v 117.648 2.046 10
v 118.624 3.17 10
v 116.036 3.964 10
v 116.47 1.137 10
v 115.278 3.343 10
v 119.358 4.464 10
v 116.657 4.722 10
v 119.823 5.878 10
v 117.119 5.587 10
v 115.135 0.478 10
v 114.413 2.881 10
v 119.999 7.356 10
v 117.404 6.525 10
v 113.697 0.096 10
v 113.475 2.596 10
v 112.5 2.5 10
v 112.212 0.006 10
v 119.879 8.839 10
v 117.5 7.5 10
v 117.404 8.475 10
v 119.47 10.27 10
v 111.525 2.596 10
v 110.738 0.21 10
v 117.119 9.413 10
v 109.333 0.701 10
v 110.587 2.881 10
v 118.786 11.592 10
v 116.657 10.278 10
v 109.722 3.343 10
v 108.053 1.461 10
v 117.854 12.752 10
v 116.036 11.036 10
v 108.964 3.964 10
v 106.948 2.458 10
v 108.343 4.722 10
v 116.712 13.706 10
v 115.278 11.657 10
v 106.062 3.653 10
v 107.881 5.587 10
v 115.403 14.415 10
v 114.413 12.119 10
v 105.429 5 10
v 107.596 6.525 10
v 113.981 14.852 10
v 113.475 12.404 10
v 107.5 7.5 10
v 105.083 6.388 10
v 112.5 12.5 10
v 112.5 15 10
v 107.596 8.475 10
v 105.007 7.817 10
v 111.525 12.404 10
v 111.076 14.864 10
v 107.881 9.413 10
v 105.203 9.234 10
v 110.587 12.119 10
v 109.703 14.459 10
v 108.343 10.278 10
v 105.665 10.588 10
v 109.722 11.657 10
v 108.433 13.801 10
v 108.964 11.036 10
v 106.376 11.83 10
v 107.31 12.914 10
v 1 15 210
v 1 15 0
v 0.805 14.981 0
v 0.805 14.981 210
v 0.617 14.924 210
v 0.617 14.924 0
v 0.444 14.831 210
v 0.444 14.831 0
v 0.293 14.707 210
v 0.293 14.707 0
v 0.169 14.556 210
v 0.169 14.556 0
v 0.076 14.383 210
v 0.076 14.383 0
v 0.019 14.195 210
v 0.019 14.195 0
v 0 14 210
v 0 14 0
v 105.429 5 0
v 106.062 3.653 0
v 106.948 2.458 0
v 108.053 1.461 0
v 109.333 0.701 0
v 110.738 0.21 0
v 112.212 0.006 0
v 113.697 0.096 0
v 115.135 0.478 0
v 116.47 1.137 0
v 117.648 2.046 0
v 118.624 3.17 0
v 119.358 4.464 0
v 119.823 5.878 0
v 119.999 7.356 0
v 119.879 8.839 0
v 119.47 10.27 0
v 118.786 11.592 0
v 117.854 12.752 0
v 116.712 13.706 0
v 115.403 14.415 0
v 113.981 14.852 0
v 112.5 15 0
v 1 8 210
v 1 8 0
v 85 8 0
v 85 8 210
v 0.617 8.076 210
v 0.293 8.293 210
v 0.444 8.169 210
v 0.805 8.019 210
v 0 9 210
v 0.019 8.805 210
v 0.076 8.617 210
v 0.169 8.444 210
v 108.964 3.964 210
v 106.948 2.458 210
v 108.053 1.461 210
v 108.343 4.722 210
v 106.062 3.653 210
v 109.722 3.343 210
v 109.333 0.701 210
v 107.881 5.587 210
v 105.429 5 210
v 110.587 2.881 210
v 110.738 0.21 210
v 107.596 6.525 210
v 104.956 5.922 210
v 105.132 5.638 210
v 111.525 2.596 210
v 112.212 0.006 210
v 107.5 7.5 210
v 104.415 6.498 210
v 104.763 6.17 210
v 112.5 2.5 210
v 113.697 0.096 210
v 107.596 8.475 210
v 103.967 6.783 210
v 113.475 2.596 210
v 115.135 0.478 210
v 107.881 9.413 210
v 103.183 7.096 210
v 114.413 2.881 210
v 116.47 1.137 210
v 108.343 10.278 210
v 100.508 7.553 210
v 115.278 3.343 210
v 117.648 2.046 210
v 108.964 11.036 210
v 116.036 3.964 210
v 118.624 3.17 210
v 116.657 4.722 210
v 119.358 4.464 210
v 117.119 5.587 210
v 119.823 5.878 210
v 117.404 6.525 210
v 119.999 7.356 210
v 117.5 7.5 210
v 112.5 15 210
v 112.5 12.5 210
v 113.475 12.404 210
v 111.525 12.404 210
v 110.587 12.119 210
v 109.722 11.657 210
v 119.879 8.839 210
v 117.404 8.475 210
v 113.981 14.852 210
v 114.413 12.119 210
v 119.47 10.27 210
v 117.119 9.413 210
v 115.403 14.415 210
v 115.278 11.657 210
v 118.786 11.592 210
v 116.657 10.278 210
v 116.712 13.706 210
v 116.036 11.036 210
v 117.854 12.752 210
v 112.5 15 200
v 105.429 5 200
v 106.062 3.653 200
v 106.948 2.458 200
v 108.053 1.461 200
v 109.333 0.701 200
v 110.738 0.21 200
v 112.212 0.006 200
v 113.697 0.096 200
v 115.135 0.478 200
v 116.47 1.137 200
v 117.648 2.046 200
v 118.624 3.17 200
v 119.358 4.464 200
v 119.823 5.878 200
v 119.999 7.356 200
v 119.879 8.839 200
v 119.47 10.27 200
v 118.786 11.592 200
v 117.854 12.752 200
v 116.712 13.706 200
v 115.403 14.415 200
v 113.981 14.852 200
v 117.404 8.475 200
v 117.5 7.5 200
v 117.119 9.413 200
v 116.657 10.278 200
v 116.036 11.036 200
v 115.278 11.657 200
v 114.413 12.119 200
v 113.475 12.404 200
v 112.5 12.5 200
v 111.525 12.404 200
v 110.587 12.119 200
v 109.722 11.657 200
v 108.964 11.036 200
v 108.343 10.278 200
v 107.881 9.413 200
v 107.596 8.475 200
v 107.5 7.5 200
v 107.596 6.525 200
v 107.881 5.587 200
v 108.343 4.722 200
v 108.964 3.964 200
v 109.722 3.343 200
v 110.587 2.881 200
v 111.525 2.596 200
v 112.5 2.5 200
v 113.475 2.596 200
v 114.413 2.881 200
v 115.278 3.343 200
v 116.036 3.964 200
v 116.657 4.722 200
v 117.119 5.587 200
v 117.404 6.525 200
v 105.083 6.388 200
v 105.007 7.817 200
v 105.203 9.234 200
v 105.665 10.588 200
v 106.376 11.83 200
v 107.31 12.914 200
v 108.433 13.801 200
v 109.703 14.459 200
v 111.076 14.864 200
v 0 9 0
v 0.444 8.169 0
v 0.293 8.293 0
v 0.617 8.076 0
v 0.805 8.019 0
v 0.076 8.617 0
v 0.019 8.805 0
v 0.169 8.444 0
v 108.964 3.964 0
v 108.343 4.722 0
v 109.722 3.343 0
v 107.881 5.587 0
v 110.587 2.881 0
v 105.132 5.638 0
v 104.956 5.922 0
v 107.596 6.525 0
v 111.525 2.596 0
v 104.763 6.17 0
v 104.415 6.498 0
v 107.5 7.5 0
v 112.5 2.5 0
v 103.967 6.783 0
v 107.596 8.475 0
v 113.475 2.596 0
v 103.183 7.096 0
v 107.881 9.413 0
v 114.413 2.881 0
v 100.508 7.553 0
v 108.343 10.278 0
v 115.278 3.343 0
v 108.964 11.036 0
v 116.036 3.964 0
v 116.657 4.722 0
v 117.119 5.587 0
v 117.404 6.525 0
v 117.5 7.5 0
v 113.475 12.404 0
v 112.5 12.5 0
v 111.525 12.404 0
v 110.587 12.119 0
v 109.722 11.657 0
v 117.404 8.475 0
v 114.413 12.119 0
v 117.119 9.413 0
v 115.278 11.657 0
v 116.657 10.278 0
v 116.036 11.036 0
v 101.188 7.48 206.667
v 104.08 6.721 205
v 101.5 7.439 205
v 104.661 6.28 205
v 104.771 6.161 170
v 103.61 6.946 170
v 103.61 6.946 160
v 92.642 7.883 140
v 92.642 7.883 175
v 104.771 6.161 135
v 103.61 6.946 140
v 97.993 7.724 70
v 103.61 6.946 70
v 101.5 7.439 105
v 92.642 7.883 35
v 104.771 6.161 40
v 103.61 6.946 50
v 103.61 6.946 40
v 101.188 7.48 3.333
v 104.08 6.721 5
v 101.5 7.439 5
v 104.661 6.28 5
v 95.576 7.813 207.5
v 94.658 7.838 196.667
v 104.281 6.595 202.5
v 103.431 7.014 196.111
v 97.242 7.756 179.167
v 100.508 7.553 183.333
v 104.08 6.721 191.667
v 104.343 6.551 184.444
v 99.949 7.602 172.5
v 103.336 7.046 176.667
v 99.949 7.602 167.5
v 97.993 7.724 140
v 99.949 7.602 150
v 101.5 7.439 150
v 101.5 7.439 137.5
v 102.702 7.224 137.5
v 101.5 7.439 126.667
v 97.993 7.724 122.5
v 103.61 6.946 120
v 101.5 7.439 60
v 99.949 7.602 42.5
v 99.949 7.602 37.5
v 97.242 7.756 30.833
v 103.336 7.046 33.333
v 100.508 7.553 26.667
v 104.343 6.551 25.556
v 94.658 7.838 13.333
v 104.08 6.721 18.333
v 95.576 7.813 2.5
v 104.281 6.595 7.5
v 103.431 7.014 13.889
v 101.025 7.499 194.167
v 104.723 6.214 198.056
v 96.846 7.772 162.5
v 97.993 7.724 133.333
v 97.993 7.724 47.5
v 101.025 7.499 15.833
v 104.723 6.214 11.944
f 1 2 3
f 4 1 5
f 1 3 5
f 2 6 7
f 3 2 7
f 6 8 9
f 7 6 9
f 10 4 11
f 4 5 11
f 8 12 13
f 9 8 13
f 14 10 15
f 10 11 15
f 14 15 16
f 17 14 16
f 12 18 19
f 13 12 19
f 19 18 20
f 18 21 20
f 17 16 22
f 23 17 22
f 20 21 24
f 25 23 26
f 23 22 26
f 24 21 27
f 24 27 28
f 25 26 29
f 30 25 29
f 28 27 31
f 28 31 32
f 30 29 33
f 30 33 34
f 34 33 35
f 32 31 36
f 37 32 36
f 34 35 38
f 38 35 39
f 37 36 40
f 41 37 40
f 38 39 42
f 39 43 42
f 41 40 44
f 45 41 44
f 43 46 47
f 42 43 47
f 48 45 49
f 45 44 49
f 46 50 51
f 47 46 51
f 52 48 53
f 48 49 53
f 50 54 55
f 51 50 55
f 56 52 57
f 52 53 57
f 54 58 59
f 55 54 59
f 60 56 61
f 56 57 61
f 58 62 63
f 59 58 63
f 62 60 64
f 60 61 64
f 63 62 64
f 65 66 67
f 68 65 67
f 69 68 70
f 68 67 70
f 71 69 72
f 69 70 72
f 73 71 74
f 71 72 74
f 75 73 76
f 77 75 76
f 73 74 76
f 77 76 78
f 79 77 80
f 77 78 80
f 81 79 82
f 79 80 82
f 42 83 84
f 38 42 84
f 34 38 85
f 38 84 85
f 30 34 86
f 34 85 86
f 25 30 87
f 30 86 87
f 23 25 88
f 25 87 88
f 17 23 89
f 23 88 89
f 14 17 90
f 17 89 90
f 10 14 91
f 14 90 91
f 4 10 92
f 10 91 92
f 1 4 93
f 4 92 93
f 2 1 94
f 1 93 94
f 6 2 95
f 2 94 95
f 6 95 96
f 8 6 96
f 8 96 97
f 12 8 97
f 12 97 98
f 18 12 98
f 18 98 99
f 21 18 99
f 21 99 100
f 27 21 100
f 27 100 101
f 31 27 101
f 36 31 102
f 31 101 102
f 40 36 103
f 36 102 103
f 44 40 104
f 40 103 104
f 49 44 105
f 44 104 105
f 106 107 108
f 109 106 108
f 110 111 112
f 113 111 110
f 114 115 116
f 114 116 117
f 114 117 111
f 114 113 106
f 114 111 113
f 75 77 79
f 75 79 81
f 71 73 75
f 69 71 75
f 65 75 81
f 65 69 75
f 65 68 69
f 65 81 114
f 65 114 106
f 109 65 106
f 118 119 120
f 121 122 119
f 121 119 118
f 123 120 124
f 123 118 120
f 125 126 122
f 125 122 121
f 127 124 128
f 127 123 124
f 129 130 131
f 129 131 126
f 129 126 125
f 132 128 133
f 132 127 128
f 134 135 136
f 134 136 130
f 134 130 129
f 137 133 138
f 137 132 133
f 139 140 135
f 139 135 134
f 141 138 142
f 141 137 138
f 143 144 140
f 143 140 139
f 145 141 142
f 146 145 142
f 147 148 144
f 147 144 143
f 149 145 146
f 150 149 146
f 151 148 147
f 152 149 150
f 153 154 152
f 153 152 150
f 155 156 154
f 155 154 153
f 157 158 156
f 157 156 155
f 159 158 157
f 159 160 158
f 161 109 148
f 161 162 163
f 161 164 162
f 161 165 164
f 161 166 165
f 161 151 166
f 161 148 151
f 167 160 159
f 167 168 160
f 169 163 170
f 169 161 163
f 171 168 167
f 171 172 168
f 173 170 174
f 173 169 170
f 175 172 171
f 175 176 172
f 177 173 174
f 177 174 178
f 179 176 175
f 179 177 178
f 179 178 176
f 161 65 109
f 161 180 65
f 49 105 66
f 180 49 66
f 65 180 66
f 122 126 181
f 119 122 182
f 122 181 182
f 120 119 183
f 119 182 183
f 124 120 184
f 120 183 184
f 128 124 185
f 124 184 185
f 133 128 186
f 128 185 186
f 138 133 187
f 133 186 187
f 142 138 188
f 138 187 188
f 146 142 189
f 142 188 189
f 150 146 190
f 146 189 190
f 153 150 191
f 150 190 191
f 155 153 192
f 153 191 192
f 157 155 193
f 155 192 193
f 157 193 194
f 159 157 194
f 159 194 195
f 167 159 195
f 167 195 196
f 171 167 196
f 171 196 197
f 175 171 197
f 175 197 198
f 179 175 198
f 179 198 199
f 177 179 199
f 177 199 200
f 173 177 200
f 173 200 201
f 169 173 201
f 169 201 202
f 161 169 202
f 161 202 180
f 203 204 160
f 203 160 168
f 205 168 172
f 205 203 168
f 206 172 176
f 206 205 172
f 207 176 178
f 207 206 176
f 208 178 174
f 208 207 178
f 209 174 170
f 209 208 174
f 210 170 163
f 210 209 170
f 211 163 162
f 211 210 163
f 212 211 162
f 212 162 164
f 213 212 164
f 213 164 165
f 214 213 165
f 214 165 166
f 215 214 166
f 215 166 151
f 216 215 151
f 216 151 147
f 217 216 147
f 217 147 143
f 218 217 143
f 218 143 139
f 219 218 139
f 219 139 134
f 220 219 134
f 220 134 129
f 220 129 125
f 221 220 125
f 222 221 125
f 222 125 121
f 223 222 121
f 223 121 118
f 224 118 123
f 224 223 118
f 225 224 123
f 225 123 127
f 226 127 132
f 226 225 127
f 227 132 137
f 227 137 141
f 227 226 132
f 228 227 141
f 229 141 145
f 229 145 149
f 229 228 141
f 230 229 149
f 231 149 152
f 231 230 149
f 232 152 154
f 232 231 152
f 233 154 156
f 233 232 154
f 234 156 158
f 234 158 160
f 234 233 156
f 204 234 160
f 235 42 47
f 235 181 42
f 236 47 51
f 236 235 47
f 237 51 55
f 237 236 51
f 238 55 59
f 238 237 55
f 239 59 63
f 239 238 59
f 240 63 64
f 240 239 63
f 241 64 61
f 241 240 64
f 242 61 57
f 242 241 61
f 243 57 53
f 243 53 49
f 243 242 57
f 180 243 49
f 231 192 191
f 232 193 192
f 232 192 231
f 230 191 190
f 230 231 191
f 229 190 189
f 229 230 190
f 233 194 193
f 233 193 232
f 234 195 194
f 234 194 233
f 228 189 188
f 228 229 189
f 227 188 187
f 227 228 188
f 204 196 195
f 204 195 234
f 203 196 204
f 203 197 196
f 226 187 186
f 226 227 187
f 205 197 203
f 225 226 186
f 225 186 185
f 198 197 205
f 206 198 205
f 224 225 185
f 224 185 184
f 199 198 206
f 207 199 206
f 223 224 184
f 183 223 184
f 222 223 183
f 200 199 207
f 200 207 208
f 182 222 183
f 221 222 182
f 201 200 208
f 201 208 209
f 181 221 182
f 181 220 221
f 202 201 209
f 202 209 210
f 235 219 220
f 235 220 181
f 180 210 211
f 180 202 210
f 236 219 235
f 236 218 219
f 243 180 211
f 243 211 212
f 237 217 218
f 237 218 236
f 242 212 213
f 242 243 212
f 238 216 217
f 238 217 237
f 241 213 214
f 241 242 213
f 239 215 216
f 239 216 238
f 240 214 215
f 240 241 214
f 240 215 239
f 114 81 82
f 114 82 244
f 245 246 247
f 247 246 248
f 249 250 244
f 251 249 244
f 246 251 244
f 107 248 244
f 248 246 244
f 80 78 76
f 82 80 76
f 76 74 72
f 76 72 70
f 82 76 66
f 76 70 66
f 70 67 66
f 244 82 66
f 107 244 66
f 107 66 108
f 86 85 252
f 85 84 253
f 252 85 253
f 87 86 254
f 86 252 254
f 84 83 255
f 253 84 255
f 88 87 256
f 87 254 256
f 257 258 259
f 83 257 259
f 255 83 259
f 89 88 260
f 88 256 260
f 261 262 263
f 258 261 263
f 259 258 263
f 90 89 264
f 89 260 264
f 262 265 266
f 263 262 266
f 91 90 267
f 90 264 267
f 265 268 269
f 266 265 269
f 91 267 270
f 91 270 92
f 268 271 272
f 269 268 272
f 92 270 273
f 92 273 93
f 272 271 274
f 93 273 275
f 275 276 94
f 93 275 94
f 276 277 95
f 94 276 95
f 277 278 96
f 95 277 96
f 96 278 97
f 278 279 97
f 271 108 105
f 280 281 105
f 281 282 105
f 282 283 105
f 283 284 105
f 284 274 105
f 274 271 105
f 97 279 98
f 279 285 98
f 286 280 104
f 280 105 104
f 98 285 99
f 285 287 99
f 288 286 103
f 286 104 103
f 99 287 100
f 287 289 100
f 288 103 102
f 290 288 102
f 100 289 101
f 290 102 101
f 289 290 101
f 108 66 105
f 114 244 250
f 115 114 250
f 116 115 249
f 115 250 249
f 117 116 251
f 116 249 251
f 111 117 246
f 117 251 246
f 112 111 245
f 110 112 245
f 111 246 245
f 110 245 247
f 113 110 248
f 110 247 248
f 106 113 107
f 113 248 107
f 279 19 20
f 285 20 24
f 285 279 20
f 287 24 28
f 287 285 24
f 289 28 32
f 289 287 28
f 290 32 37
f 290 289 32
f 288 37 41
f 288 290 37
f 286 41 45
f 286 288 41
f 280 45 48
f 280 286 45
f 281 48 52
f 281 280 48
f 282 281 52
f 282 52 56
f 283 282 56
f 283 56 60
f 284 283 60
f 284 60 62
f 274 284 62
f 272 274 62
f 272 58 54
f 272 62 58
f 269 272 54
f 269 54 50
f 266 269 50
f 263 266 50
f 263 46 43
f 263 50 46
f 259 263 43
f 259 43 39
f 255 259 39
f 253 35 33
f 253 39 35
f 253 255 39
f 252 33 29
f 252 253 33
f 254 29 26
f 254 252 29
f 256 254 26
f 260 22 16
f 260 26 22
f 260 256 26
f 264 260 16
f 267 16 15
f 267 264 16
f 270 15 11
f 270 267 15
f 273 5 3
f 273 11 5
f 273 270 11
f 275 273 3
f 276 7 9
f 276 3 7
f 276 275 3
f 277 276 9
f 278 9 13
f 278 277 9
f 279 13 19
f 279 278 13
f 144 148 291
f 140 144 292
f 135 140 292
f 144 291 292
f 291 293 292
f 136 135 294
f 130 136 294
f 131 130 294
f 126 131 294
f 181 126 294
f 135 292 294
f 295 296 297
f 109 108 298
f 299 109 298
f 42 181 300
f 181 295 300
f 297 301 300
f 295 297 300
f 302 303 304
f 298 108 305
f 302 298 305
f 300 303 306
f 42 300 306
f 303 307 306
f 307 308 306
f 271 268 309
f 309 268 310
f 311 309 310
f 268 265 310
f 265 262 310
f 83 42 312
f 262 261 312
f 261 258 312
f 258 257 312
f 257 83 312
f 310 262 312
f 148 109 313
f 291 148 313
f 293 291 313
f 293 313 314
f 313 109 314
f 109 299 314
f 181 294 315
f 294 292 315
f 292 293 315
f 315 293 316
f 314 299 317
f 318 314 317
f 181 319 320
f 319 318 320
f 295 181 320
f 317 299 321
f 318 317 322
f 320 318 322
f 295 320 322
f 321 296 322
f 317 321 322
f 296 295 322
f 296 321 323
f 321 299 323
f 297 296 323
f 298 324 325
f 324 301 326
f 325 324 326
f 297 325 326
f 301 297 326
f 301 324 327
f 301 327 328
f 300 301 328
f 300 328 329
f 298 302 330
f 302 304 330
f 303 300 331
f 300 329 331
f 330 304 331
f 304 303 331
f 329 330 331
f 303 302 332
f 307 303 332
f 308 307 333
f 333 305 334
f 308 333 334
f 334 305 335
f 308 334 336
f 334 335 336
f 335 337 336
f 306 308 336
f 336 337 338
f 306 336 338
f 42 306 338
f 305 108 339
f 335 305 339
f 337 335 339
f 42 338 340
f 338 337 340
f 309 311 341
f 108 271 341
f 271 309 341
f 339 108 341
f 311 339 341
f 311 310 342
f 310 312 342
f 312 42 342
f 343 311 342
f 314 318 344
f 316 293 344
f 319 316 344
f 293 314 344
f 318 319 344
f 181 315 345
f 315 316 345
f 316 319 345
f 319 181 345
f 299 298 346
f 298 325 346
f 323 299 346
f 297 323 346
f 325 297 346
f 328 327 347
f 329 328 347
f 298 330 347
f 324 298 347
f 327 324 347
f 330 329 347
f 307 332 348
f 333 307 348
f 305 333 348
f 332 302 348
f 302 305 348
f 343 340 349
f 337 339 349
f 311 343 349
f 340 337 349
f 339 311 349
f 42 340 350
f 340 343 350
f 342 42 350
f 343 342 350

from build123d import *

# Parameters (mm, degrees)
SKETCH_1_R               = 5
EXTRUDE_4_DEPTH          = 210
SKETCH_3_R               = 7.5
CUT_EXTRUDE_3_DEPTH      = 95
CUT_EXTRUDE_3_DEPTH_BACK = 95


with BuildPart() as part:
    # 草图1 → 凸台-拉伸4 (new body)
    with BuildSketch(Plane.XY):
        with BuildLine():
            ThreePointArc((0, 9), (0.292893219, 8.292893219), (1, 8))
            Line((1, 8), (85, 8))
            add(Edge.make_bspline(
                [(85, 8), (102.874129485, 7.751191804), (104.316426779, 7.753525507), (105.428932188, 5)],
                knots=[0, 0, 0, 0, 1, 1, 1, 1], degree=3))
            ThreePointArc((105.428932188, 5), (118.623724357, 3.169872981), (112.5, 15))
            Line((112.5, 15), (1, 15))
            ThreePointArc((1, 15), (0.292893219, 14.707106781), (0, 14))
            Line((0, 14), (0, 9))
        make_face()
        with Locations((112.5, 7.5)):
            Circle(SKETCH_1_R, mode=Mode.SUBTRACT)
    extrude(amount=EXTRUDE_4_DEPTH)

    # 草图3 → 切除-拉伸3 (cut, two sides)
    with BuildSketch(Plane(origin=(0, 0, 105), x_dir=(-1, 0, 0), z_dir=(0, 0, -1))) as cut_extrude_3_sk:
        with Locations((-112.5, 7.5)):
            Circle(SKETCH_3_R)
    extrude(amount=CUT_EXTRUDE_3_DEPTH, mode=Mode.SUBTRACT)
    extrude(cut_extrude_3_sk.sketch, amount=-CUT_EXTRUDE_3_DEPTH_BACK, mode=Mode.SUBTRACT)


solid = part.part
